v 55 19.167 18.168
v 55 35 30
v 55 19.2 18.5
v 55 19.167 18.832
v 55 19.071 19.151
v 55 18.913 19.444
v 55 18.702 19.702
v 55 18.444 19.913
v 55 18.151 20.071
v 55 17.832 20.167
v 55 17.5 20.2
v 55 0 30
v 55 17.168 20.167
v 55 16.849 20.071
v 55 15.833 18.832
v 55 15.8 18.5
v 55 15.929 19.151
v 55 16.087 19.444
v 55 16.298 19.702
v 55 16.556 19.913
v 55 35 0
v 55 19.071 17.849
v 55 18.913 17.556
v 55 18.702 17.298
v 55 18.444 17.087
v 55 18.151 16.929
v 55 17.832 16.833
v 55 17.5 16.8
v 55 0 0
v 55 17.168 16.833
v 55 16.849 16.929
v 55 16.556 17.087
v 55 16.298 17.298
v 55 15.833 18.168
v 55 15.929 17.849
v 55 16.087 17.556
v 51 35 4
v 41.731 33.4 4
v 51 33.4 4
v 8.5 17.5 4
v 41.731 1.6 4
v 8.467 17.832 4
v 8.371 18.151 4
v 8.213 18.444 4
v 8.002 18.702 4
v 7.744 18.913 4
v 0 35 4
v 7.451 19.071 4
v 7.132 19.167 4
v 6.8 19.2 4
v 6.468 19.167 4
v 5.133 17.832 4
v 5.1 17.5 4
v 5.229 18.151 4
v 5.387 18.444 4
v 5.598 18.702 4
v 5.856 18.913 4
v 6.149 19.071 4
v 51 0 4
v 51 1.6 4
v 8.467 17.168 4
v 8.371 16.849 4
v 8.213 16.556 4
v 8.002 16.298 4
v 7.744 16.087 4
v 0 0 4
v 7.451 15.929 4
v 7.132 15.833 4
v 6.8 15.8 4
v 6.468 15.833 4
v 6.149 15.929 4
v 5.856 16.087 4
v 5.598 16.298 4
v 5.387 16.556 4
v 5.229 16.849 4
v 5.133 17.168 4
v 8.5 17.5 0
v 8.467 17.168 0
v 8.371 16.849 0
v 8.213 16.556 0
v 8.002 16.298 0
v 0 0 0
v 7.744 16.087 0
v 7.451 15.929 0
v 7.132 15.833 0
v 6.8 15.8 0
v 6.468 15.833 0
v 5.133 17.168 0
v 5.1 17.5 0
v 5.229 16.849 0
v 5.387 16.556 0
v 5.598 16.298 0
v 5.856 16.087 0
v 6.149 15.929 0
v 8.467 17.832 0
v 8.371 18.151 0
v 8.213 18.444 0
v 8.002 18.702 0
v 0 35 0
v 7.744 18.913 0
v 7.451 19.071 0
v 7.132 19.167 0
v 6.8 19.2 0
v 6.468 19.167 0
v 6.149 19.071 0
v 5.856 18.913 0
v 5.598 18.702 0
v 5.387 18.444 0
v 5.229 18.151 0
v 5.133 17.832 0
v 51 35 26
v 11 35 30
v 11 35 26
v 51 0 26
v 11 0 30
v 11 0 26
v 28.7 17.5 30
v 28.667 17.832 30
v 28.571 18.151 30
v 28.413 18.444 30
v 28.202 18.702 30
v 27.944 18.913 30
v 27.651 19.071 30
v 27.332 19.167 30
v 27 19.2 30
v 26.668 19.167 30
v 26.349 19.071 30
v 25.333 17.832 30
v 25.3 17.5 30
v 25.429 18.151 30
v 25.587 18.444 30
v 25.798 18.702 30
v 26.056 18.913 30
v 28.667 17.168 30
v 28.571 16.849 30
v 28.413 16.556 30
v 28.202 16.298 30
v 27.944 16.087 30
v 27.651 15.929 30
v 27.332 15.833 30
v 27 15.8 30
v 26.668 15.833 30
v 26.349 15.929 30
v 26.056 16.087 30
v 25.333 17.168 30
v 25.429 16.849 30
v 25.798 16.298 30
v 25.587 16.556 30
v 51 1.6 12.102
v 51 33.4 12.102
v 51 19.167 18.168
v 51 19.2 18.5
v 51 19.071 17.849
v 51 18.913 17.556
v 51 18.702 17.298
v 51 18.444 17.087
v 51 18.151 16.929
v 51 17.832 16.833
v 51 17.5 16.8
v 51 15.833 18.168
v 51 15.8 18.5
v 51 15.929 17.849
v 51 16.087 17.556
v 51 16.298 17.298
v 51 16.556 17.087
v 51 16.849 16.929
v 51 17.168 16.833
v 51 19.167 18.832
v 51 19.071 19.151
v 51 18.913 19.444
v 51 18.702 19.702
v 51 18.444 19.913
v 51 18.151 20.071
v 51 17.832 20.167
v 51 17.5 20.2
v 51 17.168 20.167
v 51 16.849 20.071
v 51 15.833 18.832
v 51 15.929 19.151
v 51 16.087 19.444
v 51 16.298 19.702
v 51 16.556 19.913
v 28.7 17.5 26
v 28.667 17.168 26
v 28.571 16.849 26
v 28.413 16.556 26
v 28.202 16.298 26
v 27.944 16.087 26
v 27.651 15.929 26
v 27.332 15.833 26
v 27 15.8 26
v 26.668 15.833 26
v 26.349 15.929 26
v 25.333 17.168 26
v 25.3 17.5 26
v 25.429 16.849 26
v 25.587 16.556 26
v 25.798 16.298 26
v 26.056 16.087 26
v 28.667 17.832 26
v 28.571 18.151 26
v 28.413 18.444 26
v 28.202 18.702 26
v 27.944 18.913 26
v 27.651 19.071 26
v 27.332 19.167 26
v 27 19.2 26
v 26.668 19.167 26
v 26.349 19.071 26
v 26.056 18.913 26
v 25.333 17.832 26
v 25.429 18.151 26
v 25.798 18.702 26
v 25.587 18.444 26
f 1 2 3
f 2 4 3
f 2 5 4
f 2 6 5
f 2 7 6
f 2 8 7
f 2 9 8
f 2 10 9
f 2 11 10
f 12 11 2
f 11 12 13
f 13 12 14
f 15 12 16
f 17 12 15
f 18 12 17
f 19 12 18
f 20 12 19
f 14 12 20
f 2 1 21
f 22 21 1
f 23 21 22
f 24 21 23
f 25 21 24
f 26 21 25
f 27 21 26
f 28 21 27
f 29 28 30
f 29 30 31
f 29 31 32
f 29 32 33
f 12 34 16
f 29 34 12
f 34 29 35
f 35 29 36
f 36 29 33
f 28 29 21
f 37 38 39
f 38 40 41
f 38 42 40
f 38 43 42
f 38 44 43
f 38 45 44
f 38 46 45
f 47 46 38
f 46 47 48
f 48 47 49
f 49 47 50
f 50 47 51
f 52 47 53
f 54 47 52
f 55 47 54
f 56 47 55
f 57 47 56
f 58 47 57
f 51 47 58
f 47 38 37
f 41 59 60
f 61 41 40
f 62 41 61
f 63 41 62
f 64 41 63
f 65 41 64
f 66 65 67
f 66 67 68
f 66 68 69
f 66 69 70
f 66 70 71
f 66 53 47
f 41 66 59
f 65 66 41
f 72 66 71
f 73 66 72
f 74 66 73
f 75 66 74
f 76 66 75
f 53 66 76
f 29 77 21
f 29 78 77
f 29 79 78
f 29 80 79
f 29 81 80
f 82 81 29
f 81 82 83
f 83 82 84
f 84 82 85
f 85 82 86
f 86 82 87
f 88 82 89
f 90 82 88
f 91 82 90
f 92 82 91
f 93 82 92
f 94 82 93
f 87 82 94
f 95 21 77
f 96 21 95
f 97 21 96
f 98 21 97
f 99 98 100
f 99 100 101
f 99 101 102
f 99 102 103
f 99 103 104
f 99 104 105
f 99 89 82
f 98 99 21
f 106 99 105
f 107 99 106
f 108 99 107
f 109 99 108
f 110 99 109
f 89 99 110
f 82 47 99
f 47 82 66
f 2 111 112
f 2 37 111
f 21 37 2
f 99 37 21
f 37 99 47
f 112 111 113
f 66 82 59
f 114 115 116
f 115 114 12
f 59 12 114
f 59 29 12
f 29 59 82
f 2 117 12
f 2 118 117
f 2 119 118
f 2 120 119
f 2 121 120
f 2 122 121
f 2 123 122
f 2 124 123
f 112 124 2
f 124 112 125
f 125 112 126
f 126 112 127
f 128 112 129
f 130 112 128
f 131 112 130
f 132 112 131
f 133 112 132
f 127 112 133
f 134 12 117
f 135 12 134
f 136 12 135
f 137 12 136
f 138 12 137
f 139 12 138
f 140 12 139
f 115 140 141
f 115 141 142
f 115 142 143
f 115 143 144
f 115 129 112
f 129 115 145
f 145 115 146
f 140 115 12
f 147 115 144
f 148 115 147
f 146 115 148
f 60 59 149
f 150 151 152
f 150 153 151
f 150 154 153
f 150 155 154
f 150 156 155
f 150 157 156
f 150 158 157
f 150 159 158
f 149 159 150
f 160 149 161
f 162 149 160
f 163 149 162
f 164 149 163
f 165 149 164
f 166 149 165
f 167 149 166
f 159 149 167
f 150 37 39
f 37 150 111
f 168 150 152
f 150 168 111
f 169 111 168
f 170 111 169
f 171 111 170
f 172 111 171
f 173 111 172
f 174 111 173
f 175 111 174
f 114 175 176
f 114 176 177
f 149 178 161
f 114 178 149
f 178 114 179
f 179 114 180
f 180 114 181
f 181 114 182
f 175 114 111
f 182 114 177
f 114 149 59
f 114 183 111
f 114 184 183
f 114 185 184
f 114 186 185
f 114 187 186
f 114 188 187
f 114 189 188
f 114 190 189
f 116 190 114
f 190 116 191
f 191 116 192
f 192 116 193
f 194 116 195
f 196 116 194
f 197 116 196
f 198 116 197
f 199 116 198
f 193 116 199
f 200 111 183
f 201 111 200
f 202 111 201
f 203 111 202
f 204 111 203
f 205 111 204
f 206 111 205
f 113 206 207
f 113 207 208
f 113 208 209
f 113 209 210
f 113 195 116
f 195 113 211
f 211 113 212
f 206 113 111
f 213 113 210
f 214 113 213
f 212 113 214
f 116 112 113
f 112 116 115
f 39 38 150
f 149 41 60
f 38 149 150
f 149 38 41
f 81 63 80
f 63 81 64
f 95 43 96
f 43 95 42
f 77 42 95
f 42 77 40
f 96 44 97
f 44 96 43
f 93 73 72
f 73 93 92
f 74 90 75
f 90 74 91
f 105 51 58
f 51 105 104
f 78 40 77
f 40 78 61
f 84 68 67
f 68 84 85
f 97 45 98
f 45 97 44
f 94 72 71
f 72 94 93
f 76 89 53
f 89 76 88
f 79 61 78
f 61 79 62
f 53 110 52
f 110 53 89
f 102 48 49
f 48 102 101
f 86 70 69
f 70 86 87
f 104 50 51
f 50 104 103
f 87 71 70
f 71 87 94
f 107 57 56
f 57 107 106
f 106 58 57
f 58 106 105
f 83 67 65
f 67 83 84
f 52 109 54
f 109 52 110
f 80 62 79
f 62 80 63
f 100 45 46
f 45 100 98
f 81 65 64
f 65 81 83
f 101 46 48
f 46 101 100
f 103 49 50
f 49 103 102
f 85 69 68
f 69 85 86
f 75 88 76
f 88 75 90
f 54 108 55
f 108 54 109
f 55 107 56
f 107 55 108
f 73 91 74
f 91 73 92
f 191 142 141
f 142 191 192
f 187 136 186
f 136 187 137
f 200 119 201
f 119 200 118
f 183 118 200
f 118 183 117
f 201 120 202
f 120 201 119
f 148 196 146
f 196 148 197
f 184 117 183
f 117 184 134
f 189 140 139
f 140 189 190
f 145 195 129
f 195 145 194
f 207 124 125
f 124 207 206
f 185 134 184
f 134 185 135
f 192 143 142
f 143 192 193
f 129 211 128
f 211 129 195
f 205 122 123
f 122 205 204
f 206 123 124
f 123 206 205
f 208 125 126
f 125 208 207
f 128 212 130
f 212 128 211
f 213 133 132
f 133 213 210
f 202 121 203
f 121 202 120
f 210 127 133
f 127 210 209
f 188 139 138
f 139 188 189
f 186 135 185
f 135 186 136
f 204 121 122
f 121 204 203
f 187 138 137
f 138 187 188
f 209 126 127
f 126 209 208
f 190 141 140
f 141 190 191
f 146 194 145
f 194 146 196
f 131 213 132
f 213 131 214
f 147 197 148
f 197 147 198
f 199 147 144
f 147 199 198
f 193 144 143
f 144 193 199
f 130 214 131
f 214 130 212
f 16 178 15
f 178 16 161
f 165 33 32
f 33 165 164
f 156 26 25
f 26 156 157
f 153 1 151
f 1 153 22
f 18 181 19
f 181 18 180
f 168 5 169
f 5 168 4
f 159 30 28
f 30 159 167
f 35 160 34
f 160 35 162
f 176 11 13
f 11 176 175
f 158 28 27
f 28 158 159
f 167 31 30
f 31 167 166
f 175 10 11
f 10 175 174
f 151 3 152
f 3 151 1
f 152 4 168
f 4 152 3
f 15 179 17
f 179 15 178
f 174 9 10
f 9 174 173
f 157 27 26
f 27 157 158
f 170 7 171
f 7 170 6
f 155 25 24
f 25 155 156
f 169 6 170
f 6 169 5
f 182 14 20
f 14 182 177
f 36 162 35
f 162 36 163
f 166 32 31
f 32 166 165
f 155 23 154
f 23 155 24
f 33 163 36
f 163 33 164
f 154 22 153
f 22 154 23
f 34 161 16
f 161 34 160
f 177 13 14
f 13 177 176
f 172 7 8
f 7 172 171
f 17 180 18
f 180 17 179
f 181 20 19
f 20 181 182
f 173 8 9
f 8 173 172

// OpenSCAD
$fn = 32;

// ----------------------------------------------------------------------
// Z-bracket: 55 x 35 x 30 mm
// ----------------------------------------------------------------------

// --- parameters (mm) ---
lower_leg = 55;           // lower foot length, X
upper_leg = 40;           // upper foot length, X
bracket_w = 35;           // bracket width, Y
offset_h = 30;            // overall rise, Z
sheet_t = 4;              // plate thickness
hole_d = 3.4;             // clearance for M3
rib_len = 11.1;           // gusset leg
rib_sink = 1.6;           // gusset overlap into the plates

module hole_z(px, py, z0) {
  translate([px, py, z0 - 2.5]) cylinder(h = sheet_t + 5, d = hole_d);
}
module hole_x(py, pz) {
  translate([-2.5, py, pz]) rotate([0, 90, 0]) cylinder(h = sheet_t + 5, d = hole_d);
}
module gusset(x0) {
  translate([x0, bracket_w - rib_sink, 0])
    rotate([90, 0, 0])
      linear_extrude(height = bracket_w - 2 * rib_sink)
        polygon(points = [[rib_sink, sheet_t - rib_sink],
                          [rib_sink, sheet_t - rib_sink + rib_len],
                          [-rib_len, sheet_t - rib_sink]]);
}

difference() {
  union() {
    cube([lower_leg, bracket_w, sheet_t]);
    /* web, overlapping the lower foot */
    translate([lower_leg - sheet_t, 0, 0]) cube([sheet_t, bracket_w, offset_h]);
    /* upper foot, sunk into the web */
    translate([lower_leg - sheet_t - upper_leg, 0, offset_h - sheet_t]) cube([upper_leg + sheet_t, bracket_w, sheet_t]);
    gusset(lower_leg - sheet_t);
  }
  hole_z(6.8, 17.5, 0);
  translate([lower_leg - sheet_t - 24, 0, 0]) hole_z(0, 17.5, offset_h - sheet_t);
  translate([lower_leg - sheet_t, 0, 0]) hole_x(17.5, 18.5);
}
